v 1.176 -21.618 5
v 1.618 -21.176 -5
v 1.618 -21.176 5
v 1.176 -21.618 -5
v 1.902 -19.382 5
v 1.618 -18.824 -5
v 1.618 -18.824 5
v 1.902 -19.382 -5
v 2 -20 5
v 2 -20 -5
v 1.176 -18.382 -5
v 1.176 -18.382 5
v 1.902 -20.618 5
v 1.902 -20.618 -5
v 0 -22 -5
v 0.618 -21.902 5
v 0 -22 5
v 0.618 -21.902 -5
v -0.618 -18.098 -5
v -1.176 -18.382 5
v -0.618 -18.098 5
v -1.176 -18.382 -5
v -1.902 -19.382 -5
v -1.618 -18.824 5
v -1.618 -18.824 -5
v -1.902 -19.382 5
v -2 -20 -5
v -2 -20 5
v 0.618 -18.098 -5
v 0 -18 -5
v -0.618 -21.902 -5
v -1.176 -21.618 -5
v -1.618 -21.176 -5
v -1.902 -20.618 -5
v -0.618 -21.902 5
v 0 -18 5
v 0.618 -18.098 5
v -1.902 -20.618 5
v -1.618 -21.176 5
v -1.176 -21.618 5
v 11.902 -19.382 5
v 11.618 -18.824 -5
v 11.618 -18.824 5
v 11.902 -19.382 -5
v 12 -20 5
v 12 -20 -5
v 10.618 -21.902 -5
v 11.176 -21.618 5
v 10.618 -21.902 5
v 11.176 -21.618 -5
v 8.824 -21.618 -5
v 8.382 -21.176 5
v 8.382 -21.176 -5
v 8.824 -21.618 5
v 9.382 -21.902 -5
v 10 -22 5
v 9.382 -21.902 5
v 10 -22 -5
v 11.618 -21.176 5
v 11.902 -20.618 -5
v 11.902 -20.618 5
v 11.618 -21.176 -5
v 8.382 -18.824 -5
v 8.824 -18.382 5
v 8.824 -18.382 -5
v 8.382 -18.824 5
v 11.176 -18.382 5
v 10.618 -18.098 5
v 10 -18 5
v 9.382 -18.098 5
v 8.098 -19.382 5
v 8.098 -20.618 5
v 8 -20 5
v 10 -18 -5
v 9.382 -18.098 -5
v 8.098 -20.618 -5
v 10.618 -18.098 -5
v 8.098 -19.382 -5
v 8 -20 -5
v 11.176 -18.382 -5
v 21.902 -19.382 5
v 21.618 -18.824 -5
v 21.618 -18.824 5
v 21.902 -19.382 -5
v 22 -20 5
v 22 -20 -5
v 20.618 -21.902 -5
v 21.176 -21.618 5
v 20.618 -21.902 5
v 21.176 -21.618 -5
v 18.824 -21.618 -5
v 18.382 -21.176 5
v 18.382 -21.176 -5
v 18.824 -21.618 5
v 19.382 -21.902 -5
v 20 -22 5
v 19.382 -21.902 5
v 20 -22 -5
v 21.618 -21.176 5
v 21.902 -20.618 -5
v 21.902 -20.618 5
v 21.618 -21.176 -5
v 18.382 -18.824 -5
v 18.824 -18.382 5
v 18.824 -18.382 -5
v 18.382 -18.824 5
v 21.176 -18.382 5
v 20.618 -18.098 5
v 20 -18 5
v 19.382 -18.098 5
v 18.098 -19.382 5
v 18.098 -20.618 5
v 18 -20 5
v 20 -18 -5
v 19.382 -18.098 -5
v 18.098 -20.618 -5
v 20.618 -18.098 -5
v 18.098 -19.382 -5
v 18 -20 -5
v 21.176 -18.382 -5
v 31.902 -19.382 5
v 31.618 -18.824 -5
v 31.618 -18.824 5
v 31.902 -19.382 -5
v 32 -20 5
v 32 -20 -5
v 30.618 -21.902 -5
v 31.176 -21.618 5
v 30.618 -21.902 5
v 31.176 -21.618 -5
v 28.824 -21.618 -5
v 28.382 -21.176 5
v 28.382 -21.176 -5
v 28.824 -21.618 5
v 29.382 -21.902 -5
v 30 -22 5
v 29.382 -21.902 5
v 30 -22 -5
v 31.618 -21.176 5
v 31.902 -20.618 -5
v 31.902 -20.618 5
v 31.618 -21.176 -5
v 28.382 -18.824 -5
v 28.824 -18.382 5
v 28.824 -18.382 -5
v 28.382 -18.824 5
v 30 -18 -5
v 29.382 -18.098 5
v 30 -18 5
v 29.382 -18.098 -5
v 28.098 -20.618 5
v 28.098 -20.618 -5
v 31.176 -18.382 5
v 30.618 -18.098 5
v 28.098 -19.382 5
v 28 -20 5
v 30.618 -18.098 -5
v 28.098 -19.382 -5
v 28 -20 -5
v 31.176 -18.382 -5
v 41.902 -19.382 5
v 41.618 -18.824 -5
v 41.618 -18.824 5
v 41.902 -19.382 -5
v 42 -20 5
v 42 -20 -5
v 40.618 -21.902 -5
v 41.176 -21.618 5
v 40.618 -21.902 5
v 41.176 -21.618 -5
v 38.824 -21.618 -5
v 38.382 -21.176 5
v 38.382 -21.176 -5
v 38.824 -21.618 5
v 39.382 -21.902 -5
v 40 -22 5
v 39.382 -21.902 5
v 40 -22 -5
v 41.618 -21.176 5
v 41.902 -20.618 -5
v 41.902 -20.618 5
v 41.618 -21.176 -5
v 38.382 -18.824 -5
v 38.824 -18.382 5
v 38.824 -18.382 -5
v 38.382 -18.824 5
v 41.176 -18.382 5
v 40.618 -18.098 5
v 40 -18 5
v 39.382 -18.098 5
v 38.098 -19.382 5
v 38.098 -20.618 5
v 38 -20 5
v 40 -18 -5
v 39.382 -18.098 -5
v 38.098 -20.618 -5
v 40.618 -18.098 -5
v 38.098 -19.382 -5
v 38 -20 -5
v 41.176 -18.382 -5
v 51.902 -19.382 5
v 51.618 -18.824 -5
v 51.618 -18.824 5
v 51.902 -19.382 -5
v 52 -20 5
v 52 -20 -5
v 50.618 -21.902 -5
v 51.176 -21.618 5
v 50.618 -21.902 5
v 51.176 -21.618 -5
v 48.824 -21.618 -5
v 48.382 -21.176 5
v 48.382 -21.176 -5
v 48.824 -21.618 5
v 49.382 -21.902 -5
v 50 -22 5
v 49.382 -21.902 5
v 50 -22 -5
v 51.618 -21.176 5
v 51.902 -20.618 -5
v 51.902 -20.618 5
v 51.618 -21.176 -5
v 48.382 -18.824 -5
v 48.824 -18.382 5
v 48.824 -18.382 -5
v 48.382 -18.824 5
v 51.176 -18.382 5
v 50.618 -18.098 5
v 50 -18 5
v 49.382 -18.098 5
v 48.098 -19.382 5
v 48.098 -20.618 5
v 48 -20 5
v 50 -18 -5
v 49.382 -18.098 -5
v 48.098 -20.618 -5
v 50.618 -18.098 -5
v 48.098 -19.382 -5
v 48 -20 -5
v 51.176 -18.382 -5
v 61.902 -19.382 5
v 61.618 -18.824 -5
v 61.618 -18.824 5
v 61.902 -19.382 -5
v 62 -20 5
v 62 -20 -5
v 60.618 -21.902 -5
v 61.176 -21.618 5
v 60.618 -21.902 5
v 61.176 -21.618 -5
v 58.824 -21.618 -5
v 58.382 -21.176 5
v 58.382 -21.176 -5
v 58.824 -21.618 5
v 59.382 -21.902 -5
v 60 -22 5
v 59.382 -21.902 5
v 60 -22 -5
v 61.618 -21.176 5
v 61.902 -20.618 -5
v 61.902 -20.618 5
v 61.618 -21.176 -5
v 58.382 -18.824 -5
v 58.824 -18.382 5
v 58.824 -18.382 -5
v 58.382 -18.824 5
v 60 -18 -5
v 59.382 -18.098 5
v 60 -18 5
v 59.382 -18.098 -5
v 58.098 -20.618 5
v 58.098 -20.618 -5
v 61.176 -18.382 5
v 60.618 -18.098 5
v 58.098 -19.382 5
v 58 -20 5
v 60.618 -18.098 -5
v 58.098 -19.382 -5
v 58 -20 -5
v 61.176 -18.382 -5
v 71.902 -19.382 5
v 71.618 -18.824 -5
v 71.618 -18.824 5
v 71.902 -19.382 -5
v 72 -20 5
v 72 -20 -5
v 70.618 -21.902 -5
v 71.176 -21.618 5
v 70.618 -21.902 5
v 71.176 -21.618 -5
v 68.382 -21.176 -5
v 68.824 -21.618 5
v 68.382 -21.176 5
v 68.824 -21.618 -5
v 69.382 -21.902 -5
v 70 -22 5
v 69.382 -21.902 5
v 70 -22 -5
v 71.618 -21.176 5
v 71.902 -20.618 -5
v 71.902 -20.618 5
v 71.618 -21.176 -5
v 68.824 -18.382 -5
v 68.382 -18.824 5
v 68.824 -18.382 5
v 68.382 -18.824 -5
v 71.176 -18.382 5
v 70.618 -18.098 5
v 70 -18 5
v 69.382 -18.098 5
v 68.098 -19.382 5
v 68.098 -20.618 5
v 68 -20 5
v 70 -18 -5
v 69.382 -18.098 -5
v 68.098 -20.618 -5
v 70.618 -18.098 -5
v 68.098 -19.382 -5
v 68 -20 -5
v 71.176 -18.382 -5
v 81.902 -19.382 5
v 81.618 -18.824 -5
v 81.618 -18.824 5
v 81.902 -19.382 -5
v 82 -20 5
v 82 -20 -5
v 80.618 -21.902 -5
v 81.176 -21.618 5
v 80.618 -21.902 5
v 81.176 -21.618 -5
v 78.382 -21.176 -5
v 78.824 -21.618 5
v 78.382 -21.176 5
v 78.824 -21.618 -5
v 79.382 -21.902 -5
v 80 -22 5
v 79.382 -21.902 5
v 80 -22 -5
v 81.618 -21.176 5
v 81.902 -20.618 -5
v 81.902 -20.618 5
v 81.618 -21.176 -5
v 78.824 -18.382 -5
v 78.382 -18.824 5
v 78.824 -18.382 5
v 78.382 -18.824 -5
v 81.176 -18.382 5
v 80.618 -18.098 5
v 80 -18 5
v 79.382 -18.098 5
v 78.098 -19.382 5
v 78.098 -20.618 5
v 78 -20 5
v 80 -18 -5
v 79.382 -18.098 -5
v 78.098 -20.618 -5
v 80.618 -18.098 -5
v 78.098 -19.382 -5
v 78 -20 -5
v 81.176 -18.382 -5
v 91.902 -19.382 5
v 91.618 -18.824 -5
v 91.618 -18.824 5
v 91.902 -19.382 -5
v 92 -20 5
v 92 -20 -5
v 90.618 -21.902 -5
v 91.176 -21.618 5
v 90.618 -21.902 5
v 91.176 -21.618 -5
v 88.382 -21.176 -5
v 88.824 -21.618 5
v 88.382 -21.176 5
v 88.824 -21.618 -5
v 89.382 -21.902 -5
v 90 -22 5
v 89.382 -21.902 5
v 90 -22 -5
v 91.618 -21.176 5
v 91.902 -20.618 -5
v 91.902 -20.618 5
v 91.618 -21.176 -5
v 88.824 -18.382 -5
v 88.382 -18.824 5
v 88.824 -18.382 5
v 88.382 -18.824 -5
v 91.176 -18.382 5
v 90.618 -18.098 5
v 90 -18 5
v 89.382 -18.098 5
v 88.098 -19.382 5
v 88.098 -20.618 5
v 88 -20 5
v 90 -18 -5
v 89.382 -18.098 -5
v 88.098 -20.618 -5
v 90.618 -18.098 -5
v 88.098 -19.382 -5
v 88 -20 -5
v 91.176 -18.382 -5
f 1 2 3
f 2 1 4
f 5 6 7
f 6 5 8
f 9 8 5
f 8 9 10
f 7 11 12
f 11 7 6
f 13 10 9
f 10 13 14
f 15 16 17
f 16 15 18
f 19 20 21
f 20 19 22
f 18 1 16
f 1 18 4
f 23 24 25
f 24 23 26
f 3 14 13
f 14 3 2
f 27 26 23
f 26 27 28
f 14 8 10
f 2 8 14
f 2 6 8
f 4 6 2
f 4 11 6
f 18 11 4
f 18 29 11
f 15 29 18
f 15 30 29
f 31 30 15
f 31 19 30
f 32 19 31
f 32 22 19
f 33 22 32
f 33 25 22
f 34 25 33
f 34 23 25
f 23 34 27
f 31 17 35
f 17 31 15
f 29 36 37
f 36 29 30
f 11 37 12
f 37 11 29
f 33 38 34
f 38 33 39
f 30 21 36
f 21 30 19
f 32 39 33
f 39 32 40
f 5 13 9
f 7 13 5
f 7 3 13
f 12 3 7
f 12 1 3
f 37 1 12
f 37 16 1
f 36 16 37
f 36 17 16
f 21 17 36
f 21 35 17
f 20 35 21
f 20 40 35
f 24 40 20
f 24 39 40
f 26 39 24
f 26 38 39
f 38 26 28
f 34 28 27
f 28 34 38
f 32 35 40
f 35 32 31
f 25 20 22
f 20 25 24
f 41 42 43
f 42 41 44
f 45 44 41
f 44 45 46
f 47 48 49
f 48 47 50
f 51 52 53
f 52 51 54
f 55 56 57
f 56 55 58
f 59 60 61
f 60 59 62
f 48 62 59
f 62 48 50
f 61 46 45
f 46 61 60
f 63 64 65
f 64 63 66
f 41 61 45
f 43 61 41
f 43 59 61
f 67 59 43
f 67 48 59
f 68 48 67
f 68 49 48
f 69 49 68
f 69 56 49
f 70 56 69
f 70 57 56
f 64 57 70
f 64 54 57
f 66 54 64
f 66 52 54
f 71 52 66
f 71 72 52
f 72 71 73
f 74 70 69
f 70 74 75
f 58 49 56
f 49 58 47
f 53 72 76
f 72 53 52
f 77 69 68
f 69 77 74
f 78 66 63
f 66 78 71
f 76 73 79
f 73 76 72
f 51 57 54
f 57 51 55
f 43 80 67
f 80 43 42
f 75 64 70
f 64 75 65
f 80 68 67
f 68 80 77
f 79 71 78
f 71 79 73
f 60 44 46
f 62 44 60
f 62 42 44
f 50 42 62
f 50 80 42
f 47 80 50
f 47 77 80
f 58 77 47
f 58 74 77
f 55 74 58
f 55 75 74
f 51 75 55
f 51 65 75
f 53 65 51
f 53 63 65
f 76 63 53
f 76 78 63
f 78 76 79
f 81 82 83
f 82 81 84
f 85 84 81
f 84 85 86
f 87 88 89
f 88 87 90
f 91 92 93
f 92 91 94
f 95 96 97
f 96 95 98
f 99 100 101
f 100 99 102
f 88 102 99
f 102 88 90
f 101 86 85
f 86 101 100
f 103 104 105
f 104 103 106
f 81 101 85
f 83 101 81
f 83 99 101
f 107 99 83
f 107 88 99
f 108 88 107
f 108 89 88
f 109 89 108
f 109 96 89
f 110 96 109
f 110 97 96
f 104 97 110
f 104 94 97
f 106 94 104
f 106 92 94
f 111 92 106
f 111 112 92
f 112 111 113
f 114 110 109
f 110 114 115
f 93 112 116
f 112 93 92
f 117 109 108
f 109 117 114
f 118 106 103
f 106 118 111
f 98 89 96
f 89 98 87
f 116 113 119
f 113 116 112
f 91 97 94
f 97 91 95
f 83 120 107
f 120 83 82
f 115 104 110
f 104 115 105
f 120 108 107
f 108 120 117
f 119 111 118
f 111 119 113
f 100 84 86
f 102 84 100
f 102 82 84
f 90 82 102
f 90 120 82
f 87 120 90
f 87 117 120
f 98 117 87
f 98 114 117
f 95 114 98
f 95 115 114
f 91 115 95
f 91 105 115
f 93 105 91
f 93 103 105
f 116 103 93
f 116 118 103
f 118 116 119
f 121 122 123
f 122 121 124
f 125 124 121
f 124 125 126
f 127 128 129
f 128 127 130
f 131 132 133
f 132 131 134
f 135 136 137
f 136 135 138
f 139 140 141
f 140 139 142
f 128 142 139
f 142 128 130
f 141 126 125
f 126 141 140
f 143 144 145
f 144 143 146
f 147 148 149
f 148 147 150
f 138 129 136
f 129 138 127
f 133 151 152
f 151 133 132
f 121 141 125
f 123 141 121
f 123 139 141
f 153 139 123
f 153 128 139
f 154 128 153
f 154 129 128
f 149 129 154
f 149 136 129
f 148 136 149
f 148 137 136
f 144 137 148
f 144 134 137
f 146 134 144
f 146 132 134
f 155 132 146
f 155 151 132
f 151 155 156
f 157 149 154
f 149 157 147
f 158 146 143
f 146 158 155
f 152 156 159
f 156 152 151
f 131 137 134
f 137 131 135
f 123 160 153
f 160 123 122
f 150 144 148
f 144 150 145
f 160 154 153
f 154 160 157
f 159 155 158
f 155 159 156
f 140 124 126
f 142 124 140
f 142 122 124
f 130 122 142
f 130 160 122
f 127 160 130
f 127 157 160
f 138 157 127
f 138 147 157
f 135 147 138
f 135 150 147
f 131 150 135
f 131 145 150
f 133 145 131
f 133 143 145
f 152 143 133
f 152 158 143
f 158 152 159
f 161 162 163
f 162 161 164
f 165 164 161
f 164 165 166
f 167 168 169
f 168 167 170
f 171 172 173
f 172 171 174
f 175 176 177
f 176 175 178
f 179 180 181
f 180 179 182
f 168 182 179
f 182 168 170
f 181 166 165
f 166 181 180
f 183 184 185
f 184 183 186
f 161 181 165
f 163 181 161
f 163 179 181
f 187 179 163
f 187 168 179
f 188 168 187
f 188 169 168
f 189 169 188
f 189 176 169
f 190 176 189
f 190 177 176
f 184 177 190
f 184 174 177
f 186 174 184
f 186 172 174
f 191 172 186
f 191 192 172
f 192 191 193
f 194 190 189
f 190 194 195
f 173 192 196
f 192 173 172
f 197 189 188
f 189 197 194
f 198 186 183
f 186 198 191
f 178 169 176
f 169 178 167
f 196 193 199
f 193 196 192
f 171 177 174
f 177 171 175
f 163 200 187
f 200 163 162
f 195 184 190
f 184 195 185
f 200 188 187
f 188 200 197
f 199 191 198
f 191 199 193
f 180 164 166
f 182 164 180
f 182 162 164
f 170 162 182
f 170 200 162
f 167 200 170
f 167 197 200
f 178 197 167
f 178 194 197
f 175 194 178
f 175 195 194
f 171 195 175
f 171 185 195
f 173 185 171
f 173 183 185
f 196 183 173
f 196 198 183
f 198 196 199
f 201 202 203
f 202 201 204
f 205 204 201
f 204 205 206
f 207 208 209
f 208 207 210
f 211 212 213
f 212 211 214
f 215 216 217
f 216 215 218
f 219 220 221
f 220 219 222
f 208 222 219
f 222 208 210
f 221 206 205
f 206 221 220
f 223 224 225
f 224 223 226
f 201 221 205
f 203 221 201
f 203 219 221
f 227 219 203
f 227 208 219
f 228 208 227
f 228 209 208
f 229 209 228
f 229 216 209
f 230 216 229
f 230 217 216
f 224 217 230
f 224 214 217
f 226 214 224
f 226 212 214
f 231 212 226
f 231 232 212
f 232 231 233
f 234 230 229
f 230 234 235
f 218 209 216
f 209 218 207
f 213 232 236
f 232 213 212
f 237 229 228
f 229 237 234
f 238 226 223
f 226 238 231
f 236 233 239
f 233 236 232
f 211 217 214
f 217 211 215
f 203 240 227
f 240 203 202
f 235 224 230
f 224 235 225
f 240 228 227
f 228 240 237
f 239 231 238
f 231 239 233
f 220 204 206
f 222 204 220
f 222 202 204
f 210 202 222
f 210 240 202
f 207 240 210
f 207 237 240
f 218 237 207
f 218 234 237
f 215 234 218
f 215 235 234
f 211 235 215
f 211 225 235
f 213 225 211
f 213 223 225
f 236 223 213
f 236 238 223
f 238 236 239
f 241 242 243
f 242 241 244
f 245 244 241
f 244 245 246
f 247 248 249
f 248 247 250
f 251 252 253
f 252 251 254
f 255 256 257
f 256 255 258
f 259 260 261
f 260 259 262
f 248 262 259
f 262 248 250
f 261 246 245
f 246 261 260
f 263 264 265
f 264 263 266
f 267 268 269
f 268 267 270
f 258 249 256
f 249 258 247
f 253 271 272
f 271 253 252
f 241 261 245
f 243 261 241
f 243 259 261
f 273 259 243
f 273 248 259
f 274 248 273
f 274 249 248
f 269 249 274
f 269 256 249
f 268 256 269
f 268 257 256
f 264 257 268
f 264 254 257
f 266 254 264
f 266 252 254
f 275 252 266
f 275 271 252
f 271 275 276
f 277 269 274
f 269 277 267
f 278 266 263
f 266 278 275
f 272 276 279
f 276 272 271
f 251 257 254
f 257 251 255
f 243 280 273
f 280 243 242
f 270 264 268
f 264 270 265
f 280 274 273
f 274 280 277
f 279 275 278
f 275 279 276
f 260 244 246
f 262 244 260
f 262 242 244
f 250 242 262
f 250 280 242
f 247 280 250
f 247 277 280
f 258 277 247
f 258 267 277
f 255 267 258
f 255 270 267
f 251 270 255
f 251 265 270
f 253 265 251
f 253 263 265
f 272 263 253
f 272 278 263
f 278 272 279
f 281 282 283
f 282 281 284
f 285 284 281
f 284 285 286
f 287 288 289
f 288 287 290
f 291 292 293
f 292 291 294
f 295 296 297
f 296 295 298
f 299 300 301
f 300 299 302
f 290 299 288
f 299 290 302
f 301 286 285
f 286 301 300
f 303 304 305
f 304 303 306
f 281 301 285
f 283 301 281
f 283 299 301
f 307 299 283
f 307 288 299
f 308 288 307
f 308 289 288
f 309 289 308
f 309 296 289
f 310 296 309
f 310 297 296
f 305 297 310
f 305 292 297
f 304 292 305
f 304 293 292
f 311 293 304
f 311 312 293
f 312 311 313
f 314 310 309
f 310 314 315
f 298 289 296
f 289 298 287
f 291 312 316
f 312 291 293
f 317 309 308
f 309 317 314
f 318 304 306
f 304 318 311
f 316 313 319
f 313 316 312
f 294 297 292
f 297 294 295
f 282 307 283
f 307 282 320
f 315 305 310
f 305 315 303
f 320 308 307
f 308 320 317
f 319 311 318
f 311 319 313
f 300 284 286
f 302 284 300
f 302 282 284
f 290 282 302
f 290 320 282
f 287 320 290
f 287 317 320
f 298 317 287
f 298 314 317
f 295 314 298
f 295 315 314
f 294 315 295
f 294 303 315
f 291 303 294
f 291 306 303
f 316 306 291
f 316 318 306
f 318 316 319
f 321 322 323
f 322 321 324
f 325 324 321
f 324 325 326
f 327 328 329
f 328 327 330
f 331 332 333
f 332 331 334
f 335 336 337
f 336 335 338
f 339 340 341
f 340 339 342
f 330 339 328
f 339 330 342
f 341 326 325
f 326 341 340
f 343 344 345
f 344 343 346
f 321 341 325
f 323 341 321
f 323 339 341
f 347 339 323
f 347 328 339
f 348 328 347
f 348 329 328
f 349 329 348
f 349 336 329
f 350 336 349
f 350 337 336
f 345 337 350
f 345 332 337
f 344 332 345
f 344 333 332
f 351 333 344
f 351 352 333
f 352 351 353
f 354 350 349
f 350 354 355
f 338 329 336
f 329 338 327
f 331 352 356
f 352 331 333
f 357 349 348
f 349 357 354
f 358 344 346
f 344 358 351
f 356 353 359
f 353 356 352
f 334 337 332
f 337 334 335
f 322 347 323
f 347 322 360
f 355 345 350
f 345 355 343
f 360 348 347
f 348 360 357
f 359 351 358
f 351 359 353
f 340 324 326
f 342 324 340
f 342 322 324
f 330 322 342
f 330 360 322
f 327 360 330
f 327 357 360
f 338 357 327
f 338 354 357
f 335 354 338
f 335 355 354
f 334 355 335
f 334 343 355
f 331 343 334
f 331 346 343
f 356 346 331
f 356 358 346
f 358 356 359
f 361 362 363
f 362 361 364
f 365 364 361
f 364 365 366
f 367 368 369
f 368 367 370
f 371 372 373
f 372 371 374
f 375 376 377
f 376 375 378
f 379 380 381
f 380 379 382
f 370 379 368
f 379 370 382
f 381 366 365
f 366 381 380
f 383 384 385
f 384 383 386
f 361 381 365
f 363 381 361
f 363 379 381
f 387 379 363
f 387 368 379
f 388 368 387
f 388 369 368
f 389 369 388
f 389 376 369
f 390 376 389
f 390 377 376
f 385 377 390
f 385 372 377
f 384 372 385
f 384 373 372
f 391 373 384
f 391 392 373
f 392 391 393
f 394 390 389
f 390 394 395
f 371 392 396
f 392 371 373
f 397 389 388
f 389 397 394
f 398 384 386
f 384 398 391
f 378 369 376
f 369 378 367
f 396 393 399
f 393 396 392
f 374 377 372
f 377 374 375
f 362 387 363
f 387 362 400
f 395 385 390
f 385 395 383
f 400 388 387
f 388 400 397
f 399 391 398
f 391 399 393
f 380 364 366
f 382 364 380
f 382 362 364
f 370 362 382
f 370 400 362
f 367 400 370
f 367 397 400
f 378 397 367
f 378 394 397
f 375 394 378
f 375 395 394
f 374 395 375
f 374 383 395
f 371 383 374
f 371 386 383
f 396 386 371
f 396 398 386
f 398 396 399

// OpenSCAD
drill = 4;
h1 = 10;
d = 10;
n=10;
  
translate([0,-20,0]) 
for (i=[0:n-1]){ 
    translate([i*d,0,0])
    cylinder(r=drill/2, h=h1, $fn=20, center=true);
}
